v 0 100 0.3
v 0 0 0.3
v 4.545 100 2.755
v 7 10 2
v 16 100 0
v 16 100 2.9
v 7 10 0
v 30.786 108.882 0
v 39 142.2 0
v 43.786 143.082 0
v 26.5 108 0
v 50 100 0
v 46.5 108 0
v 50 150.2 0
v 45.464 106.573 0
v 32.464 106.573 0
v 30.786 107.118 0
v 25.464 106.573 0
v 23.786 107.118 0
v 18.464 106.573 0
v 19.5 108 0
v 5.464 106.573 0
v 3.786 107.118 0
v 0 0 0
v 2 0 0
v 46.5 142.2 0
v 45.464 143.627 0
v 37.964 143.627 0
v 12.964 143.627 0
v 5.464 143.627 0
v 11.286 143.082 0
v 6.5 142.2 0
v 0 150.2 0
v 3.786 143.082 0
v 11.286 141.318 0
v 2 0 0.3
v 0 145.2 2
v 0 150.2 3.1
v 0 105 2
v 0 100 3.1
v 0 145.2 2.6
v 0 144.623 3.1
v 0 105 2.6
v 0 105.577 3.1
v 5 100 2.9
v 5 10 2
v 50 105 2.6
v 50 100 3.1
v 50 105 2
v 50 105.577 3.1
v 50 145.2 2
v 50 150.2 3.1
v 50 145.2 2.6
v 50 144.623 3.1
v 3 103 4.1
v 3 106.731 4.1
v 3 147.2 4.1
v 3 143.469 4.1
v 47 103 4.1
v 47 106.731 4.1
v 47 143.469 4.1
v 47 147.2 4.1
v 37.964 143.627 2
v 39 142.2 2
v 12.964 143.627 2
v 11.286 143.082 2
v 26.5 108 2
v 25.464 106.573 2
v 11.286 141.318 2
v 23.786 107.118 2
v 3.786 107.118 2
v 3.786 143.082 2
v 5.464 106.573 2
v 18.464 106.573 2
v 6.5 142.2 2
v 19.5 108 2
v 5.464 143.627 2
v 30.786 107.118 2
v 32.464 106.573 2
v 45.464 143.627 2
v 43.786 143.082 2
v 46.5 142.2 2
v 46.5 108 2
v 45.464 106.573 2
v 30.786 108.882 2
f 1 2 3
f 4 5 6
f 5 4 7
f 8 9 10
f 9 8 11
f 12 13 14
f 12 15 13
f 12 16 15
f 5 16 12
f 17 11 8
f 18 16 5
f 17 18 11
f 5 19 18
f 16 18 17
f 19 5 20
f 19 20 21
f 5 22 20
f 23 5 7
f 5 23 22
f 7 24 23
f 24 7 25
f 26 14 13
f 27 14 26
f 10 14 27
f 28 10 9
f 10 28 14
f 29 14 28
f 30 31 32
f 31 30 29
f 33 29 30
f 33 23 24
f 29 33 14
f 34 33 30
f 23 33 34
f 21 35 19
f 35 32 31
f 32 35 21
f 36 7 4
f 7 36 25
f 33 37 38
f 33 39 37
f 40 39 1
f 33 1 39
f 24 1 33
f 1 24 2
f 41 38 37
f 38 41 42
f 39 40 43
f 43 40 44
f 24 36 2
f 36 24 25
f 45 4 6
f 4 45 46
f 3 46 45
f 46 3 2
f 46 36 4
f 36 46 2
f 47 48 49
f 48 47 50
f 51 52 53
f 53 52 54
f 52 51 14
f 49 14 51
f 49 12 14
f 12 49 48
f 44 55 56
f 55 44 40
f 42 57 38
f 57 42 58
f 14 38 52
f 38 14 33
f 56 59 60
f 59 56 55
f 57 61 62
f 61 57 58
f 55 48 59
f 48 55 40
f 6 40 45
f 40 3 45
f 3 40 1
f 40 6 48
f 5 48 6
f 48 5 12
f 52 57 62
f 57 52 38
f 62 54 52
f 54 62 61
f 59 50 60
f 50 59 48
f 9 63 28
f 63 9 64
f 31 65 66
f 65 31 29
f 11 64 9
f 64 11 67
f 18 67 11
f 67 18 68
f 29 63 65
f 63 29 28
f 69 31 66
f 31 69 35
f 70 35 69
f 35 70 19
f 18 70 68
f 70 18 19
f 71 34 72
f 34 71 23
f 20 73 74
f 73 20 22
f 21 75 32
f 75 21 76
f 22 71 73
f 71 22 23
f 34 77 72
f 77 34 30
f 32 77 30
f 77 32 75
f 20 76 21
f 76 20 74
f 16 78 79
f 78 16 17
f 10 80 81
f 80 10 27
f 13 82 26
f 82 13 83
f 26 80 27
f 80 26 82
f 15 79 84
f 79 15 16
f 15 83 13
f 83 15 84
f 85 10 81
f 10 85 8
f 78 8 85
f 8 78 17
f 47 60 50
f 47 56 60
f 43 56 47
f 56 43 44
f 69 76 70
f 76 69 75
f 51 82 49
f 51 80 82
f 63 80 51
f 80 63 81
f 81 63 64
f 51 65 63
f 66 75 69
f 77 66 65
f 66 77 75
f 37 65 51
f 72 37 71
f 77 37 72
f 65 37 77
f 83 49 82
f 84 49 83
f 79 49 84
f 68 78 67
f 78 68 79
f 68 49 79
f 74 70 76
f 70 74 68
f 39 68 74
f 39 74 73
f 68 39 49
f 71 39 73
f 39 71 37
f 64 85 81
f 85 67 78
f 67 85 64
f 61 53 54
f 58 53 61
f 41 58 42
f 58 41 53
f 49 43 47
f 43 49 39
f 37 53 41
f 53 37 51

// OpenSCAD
height = 0.6;
width = 40.2;

difference()
{
    union()
    {
        hull()
        {
            translate([0,0,0])
                cube([2,110,0.3]);
            translate([5,10,0])
                cube([2,1,2]);
            translate([5,110,0])
                cube([2,1,3]);
            translate([15,110,0])
                cube([2,1,3]);
        }
        hull()
        {
            translate([0,100,0])
                cube([50,10+width,2.5+height]);
            translate([3,103,2.5+height])
                cube([44,4+width,1]);
        }
    }
    union()
    {
        hull()
        {
            translate([12.5,102+width,0])
                cylinder(d=3,h=3);
            translate([25,108,0])
                cylinder(d=3,h=3);
            translate([37.5,102+width,0])
                cylinder(d=3,h=3);
        }
        hull()
        {
            translate([5,108,0])
                cylinder(d=3,h=3);
            translate([5,102+width,0])
                cylinder(d=3,h=3);
            translate([18,108,0])
                cylinder(d=3,h=3);
        }
        hull()
        {
            translate([45,108,0])
                cylinder(d=3,h=3);
            translate([45,102+width,0])
                cylinder(d=3,h=3);
            translate([32,108,0])
                cylinder(d=3,h=3);
        }
        hull()
        {
            translate([0,105,2])
                cube([50,width,height]);
            translate([0,108,4.5+height])
                cube([50,width-6,0.1]);
        }
    }
}
